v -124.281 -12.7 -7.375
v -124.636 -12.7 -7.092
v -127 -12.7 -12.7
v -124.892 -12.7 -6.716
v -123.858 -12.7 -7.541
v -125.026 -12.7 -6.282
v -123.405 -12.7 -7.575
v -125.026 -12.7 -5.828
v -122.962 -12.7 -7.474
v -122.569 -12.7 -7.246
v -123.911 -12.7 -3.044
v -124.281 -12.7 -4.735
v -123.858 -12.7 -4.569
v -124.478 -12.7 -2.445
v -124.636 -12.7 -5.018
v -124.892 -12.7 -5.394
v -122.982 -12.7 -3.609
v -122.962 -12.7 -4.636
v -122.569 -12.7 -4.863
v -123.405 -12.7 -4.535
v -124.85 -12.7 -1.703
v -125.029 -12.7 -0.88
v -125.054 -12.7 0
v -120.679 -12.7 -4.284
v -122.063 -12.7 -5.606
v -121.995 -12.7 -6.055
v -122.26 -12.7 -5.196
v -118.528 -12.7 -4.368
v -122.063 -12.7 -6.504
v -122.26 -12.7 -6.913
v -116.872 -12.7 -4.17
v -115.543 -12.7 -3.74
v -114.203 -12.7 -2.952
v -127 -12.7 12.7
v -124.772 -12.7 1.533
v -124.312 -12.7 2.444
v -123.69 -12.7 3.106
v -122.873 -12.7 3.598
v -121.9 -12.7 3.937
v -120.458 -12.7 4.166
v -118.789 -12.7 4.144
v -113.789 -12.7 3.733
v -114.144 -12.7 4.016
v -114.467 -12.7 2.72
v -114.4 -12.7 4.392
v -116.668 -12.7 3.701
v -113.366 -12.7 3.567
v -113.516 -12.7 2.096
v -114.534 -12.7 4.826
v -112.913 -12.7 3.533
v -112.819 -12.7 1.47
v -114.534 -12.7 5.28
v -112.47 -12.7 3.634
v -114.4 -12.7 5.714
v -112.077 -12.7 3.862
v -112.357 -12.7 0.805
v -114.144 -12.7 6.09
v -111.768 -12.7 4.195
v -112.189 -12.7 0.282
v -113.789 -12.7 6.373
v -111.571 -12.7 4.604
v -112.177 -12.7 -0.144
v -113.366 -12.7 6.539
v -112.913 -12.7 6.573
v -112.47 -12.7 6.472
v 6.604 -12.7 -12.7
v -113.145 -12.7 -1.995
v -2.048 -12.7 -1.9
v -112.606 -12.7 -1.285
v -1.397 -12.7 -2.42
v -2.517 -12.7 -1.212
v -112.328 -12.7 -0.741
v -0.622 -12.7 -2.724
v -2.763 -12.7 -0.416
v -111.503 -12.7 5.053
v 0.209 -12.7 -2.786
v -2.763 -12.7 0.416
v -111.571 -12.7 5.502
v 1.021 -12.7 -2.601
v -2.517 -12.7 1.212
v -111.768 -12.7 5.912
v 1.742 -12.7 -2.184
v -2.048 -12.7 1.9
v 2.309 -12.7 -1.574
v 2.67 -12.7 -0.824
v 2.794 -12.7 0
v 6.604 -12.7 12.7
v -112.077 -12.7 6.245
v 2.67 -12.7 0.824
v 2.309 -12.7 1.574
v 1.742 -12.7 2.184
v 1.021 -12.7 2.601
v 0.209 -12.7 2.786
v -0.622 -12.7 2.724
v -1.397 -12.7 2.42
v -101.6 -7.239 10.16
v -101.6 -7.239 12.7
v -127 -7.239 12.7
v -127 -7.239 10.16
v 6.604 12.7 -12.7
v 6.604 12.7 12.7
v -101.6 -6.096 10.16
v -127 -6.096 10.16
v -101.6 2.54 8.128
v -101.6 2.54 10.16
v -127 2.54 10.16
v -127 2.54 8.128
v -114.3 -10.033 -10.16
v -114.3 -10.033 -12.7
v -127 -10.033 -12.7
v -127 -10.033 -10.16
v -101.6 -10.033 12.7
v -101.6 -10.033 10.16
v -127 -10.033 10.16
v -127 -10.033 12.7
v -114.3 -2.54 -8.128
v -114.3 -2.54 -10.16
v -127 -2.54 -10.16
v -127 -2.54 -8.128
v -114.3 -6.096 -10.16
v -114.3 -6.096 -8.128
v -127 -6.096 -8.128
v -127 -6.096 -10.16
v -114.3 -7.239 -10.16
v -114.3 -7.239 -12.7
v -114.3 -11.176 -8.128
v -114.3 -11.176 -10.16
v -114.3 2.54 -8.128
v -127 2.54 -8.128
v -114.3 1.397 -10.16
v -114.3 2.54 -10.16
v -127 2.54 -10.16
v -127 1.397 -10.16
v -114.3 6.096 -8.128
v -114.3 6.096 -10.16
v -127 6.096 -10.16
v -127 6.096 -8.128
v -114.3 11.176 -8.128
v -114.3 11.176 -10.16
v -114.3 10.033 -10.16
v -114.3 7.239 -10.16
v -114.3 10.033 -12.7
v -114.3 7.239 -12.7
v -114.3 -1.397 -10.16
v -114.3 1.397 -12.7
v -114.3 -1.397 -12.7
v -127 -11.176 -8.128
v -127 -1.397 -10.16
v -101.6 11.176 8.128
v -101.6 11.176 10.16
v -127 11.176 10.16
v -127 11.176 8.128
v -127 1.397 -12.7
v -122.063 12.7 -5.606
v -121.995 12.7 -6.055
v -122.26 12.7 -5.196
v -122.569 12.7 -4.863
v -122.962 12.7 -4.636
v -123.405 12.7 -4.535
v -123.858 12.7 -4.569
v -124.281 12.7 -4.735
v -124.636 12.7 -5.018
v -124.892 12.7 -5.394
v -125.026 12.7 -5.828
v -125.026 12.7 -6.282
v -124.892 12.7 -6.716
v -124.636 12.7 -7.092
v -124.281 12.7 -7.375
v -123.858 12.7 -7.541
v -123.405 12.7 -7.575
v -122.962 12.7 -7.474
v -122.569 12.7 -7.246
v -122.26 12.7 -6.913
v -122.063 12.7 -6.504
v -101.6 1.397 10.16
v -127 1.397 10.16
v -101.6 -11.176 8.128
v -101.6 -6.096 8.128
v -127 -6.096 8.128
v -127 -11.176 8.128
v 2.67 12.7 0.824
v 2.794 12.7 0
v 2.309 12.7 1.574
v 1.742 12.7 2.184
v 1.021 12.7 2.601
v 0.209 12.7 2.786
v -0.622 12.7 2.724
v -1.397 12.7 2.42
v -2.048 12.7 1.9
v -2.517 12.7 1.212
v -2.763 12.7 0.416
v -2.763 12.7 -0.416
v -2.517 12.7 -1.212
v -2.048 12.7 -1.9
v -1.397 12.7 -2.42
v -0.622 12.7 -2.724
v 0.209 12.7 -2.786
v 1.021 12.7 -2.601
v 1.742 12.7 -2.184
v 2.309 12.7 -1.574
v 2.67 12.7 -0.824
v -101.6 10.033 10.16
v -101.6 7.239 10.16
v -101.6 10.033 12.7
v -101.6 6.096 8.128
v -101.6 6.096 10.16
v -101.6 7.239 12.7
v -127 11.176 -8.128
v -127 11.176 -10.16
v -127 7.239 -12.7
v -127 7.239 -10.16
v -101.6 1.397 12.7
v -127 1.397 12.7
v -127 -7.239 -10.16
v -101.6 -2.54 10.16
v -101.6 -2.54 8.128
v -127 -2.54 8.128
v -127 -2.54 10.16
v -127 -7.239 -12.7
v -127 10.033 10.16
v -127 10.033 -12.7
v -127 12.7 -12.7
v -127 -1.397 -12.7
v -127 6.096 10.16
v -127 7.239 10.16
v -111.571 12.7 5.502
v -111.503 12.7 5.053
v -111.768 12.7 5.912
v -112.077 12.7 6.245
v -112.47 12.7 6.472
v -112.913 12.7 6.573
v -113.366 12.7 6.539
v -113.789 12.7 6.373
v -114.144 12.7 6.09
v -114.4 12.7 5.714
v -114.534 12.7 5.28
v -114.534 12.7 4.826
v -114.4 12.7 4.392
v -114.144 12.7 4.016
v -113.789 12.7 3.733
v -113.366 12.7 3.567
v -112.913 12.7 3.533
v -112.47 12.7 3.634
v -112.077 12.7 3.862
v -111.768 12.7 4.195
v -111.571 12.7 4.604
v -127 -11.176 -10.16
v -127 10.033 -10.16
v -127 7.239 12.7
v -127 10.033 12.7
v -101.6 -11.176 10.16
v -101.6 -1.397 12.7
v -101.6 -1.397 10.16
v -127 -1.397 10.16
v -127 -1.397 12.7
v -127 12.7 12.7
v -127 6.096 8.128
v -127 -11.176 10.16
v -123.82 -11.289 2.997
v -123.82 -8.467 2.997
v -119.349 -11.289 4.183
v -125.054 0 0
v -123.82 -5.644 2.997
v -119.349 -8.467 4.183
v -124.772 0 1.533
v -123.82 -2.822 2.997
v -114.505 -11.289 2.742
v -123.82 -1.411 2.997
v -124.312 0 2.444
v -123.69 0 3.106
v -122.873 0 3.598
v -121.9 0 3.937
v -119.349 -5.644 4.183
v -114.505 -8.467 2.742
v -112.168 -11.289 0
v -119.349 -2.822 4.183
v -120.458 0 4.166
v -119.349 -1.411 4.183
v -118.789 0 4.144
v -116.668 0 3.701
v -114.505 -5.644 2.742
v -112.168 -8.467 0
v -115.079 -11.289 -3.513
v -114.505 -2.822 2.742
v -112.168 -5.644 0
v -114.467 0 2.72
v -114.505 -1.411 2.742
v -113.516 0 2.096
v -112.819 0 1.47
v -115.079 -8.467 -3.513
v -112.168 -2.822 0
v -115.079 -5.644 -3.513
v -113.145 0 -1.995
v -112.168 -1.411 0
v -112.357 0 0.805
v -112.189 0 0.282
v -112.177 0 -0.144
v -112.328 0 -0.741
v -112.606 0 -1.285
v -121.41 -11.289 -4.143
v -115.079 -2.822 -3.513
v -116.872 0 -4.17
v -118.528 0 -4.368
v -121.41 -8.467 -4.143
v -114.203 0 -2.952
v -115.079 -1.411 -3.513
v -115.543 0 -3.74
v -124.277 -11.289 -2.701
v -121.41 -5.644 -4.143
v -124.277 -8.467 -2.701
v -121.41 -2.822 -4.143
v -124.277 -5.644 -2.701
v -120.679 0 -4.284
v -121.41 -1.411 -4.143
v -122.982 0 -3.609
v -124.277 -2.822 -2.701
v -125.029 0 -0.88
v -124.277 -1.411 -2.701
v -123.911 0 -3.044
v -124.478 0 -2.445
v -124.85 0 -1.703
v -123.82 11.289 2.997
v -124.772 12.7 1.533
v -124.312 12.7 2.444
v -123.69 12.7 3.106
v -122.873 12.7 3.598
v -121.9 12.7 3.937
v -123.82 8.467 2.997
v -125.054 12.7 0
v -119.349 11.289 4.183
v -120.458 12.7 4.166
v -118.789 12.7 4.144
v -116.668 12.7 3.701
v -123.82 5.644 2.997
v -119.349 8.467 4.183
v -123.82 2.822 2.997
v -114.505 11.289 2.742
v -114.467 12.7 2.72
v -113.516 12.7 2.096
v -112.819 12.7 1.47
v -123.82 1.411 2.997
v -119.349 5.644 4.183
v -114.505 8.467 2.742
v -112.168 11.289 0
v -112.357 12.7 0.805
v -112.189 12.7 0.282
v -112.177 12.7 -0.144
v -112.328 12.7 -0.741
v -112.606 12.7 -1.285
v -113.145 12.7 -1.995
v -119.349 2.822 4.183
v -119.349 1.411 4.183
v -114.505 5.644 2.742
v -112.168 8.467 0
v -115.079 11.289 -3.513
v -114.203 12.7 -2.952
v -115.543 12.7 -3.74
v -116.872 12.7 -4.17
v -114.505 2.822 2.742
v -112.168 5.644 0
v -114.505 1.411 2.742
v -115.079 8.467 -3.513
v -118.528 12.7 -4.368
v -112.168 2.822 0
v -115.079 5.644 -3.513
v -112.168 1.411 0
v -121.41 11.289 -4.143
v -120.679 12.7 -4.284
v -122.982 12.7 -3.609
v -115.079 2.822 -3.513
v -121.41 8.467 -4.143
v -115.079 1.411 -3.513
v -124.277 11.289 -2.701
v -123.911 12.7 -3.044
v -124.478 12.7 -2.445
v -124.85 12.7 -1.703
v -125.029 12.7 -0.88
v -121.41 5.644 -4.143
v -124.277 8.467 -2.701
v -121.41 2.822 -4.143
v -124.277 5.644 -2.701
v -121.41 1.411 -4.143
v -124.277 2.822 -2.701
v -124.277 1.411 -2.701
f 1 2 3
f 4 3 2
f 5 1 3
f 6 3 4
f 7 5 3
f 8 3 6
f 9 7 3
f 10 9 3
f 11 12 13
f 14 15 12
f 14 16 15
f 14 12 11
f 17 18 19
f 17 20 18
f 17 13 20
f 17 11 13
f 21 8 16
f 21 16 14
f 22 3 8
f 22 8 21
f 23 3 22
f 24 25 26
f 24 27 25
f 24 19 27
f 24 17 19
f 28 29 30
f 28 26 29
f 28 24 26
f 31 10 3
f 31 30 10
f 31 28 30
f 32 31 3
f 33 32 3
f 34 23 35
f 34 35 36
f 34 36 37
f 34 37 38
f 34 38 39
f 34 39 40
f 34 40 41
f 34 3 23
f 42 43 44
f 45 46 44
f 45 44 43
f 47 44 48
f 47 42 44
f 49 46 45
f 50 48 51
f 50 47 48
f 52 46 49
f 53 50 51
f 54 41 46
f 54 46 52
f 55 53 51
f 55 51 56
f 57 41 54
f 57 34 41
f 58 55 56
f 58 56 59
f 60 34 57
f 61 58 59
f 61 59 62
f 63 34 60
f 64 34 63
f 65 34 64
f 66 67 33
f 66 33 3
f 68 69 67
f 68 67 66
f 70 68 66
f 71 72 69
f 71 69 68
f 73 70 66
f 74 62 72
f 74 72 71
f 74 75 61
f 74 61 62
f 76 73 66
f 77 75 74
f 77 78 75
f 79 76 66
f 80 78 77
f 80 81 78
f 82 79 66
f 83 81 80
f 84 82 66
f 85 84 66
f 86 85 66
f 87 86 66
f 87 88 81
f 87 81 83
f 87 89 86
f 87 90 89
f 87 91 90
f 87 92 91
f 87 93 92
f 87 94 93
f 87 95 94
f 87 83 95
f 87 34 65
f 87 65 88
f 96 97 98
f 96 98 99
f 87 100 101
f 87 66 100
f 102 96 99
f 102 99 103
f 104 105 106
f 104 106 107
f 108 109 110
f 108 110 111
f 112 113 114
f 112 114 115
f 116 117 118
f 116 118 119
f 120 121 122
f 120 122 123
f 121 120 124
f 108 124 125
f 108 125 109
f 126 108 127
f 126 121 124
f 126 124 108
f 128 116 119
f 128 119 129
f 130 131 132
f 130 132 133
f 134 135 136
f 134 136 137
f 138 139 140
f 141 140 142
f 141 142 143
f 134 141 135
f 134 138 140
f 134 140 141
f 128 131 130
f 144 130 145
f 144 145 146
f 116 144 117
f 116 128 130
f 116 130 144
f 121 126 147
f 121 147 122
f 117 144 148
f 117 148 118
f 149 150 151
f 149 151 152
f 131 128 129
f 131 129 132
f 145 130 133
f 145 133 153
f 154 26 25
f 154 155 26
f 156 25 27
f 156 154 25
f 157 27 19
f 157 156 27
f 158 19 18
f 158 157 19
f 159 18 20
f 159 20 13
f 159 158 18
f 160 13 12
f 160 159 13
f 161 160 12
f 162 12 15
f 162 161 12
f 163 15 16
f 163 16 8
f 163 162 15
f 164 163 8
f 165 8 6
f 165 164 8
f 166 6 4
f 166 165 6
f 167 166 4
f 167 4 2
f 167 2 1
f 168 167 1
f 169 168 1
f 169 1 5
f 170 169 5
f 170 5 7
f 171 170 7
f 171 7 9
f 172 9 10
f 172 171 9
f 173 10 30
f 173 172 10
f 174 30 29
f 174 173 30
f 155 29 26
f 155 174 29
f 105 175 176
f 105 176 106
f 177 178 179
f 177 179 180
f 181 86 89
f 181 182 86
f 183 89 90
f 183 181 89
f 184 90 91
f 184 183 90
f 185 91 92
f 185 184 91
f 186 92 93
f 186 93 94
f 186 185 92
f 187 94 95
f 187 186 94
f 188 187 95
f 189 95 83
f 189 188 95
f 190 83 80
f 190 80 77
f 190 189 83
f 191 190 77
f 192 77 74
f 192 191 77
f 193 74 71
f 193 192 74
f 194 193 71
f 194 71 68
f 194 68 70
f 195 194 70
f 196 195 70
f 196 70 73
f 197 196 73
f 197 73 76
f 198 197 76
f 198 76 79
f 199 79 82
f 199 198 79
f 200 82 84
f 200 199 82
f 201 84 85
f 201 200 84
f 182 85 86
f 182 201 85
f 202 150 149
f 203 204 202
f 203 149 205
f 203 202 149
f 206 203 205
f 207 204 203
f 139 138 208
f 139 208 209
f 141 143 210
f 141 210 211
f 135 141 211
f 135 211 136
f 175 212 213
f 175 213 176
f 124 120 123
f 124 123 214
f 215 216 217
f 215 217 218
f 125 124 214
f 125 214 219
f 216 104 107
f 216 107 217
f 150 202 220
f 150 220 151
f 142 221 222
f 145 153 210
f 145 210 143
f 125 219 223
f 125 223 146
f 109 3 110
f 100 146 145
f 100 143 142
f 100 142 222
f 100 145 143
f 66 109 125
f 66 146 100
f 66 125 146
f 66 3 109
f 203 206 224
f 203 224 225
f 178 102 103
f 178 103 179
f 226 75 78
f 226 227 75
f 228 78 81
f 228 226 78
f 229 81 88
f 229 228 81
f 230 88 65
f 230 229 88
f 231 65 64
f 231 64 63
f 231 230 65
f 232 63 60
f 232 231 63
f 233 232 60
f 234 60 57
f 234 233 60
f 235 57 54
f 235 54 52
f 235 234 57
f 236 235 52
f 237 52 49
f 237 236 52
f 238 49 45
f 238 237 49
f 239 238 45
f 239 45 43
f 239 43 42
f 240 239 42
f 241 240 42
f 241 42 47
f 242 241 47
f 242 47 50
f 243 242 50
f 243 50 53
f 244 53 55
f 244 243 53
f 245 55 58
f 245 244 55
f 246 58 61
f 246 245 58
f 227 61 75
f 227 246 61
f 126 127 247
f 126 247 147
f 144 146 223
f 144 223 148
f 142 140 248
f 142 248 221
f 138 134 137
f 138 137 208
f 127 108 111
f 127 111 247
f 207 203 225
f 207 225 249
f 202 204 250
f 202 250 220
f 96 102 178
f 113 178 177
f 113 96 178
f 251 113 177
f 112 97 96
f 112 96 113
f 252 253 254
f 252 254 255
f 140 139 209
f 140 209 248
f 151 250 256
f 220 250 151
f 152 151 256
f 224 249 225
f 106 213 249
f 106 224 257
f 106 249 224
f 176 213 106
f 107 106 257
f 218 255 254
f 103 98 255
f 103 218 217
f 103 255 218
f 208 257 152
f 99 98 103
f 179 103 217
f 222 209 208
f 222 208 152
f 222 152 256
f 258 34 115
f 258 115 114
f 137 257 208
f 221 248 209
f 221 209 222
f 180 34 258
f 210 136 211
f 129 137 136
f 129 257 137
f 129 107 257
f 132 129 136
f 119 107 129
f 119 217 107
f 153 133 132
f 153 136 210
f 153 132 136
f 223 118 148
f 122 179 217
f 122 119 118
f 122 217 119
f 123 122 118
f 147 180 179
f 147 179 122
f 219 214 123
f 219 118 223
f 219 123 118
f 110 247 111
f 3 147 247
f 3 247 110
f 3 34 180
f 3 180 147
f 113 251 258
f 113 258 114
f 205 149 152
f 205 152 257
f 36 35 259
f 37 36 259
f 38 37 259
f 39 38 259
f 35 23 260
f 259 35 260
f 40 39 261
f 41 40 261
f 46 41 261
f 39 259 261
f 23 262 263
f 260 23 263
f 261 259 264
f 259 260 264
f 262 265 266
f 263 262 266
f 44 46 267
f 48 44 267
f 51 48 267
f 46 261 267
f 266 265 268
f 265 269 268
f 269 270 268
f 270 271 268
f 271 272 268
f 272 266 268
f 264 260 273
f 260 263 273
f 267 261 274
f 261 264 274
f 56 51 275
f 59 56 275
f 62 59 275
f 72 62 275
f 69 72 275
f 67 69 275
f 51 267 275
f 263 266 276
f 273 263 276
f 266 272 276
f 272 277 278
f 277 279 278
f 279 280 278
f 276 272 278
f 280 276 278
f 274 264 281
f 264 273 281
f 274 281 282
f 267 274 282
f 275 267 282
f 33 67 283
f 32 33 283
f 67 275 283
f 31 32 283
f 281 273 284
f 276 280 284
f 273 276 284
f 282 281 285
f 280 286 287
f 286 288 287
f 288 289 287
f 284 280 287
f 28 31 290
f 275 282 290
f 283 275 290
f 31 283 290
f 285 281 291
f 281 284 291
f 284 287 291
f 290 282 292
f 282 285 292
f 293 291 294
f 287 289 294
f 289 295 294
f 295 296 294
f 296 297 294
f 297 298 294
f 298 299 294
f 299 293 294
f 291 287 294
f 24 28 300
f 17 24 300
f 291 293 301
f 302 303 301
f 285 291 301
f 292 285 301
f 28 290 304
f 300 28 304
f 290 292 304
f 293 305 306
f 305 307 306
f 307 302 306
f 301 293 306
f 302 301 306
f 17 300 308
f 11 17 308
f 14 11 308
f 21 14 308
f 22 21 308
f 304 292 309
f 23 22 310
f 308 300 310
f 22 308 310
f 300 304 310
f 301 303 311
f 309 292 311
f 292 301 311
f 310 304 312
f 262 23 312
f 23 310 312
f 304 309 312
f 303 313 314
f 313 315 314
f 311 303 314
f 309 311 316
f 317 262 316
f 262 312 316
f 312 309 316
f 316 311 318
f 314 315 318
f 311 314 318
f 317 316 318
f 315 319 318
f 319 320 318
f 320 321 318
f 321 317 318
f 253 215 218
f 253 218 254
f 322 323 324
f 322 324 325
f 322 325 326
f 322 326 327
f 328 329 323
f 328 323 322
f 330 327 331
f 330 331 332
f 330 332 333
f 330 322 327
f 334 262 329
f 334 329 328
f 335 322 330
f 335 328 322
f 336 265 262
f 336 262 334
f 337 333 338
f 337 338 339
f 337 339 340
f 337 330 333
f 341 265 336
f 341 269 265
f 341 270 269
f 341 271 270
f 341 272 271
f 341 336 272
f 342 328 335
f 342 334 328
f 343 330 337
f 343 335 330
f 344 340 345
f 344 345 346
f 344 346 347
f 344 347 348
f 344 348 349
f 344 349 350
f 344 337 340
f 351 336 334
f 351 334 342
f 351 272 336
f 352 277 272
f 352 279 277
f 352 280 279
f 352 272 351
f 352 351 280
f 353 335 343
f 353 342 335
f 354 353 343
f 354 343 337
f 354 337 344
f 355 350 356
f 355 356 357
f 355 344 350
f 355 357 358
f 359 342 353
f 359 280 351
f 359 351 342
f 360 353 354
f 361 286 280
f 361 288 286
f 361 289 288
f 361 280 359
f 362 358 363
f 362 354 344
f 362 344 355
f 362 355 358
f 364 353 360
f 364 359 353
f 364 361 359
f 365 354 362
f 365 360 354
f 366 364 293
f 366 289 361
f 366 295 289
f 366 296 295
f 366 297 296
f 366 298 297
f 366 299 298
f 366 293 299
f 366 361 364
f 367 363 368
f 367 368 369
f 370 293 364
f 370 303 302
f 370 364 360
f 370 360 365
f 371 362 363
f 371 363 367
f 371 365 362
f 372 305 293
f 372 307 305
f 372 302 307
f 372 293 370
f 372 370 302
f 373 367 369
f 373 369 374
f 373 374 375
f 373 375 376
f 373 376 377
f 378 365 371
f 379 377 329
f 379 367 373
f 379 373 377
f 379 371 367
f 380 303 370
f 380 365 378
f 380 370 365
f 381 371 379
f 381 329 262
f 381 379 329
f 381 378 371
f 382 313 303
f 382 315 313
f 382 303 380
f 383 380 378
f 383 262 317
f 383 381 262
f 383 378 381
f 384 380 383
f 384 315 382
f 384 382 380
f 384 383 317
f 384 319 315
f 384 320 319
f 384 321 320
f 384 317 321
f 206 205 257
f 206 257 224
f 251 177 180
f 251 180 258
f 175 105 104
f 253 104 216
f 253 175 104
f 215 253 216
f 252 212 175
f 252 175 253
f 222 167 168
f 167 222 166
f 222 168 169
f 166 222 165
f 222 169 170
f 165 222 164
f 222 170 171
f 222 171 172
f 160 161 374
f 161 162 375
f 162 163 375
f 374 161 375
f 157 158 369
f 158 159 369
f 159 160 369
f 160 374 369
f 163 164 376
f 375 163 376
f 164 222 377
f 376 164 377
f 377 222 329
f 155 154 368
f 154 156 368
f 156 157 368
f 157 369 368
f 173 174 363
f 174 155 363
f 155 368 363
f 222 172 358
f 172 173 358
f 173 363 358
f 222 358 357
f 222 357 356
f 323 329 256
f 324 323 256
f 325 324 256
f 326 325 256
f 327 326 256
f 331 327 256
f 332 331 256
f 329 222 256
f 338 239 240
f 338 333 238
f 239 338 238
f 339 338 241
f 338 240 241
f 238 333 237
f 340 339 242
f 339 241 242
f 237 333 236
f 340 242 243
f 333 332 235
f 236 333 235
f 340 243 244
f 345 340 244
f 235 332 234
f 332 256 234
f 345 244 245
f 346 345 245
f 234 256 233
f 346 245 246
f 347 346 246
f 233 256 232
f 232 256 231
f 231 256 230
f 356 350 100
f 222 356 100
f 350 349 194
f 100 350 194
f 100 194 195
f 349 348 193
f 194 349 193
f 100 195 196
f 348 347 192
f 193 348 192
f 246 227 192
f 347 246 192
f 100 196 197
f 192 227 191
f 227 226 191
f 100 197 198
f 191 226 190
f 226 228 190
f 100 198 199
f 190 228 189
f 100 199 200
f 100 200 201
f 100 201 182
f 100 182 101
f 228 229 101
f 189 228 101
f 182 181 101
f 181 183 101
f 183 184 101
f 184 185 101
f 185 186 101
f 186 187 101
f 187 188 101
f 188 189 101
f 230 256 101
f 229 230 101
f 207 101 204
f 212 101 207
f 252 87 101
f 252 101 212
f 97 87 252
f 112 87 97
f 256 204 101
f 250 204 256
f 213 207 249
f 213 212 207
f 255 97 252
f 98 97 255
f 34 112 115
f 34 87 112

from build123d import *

# Parameters (mm, degrees)
F0_R     = 1.524
F0_R_2   = 2.794
F1_DEPTH = 12.7
F2_DEPTH = 12.7010001
F4_DEPTH = 12.7
F5_DEPTH = 25.4


with BuildPart() as f1:
    # F0 (on Front) → F1 (new body, symmetric)
    with BuildSketch(Plane.XZ):
        Polygon((6.604, 12.7), (0, 12.7), (-127, 12.7), (-127, 0), (-127, -12.7), (0, -12.7), (6.604, -12.7), (6.604, 0), align=None)
        with Locations((-123.518936336, -6.0549625196)):
            Circle(F0_R, mode=Mode.SUBTRACT)
        Circle(F0_R_2, mode=Mode.SUBTRACT)
        with BuildLine():
            add(Edge.make_bspline(
                [(-125.0539798534, 0), (-125.0029516502, 1.0942387987), (-124.2855618498, 3.6077570352), (-119.1629399597, 4.6185731199), (-114.5907916971, 3.1303982734), (-110.8964815907, 0.069246784), (-114.9696975278, -4.0951978821), (-118.8006178953, -4.4511181723), (-121.3570598791, -4.3089217473), (-124.7050062892, -3.0354361639), (-125.1014997164, -1.0190066384), (-125.0539798534, 0)],
                knots=[0, 0, 0, 0, 0.1042218998, 0.2287510894, 0.3589019071, 0.4687869993, 0.5924471234, 0.7059785464, 0.7992375371, 0.9029436647, 1, 1, 1, 1], degree=3))
        make_face(mode=Mode.SUBTRACT)
        with Locations((-113.0270063877, 5.0530396402)):
            Circle(F0_R, mode=Mode.SUBTRACT)
    extrude(amount=F1_DEPTH, both=True)

    # F0 (on Front) → F2 (cut, through all)
    with BuildSketch(Plane.XZ):
        with BuildLine():
            add(Edge.make_bspline(
                [(-125.0539798534, 0), (-125.0029516502, 1.0942387987), (-124.2855618498, 3.6077570352), (-119.1629399597, 4.6185731199), (-114.5907916971, 3.1303982734), (-110.8964815907, 0.069246784), (-114.9696975278, -4.0951978821), (-118.8006178953, -4.4511181723), (-121.3570598791, -4.3089217473), (-124.7050062892, -3.0354361639), (-125.1014997164, -1.0190066384), (-125.0539798534, 0)],
                knots=[0, 0, 0, 0, 0.1042218998, 0.2287510894, 0.3589019071, 0.4687869993, 0.5924471234, 0.7059785464, 0.7992375371, 0.9029436647, 1, 1, 1, 1], degree=3))
        make_face()
    extrude(amount=-F2_DEPTH, mode=Mode.SUBTRACT)

    # F3 (on face) → F4 (cut)
    with BuildSketch(Plane(origin=(-127, 0, 0), x_dir=(0, -1, 0), z_dir=(-1, 0, 0))):
        Polygon((-8.636, -12.7), (-7.239, -12.7), (-7.239, -10.16), (-6.096, -10.16), (-6.096, -8.128), (-8.636, -8.128), (-11.176, -8.128), (-11.176, -10.16), (-10.033, -10.16), (-10.033, -12.7), align=None)
        Polygon((-1.397, -10.16), (-1.397, -12.7), (0, -12.7), (1.397, -12.7), (1.397, -10.16), (2.54, -10.16), (2.54, -8.128), (0, -8.128), (-2.54, -8.128), (-2.54, -10.16), align=None)
        Polygon((7.239, -10.16), (7.239, -12.7), (8.636, -12.7), (10.033, -12.7), (10.033, -10.16), (11.176, -10.16), (11.176, -8.128), (8.636, -8.128), (6.096, -8.128), (6.096, -10.16), align=None)
    extrude(amount=-F4_DEPTH, mode=Mode.SUBTRACT)

    # F3 (on face) → F5 (cut)
    with BuildSketch(Plane(origin=(-127, 0, 0), x_dir=(0, -1, 0), z_dir=(-1, 0, 0))):
        Polygon((-8.636, 12.7), (-10.033, 12.7), (-10.033, 10.16), (-11.176, 10.16), (-11.176, 8.128), (-8.636, 8.128), (-6.096, 8.128), (-6.096, 10.16), (-7.239, 10.16), (-7.239, 12.7), align=None)
        Polygon((0, 12.7), (-1.397, 12.7), (-1.397, 10.16), (-2.54, 10.16), (-2.54, 8.128), (0, 8.128), (2.54, 8.128), (2.54, 10.16), (1.397, 10.16), (1.397, 12.7), align=None)
        Polygon((10.033, 10.16), (10.033, 12.7), (8.636, 12.7), (7.239, 12.7), (7.239, 10.16), (6.096, 10.16), (6.096, 8.128), (8.636, 8.128), (11.176, 8.128), (11.176, 10.16), align=None)
    extrude(amount=-F5_DEPTH, mode=Mode.SUBTRACT)


solid = f1.part
